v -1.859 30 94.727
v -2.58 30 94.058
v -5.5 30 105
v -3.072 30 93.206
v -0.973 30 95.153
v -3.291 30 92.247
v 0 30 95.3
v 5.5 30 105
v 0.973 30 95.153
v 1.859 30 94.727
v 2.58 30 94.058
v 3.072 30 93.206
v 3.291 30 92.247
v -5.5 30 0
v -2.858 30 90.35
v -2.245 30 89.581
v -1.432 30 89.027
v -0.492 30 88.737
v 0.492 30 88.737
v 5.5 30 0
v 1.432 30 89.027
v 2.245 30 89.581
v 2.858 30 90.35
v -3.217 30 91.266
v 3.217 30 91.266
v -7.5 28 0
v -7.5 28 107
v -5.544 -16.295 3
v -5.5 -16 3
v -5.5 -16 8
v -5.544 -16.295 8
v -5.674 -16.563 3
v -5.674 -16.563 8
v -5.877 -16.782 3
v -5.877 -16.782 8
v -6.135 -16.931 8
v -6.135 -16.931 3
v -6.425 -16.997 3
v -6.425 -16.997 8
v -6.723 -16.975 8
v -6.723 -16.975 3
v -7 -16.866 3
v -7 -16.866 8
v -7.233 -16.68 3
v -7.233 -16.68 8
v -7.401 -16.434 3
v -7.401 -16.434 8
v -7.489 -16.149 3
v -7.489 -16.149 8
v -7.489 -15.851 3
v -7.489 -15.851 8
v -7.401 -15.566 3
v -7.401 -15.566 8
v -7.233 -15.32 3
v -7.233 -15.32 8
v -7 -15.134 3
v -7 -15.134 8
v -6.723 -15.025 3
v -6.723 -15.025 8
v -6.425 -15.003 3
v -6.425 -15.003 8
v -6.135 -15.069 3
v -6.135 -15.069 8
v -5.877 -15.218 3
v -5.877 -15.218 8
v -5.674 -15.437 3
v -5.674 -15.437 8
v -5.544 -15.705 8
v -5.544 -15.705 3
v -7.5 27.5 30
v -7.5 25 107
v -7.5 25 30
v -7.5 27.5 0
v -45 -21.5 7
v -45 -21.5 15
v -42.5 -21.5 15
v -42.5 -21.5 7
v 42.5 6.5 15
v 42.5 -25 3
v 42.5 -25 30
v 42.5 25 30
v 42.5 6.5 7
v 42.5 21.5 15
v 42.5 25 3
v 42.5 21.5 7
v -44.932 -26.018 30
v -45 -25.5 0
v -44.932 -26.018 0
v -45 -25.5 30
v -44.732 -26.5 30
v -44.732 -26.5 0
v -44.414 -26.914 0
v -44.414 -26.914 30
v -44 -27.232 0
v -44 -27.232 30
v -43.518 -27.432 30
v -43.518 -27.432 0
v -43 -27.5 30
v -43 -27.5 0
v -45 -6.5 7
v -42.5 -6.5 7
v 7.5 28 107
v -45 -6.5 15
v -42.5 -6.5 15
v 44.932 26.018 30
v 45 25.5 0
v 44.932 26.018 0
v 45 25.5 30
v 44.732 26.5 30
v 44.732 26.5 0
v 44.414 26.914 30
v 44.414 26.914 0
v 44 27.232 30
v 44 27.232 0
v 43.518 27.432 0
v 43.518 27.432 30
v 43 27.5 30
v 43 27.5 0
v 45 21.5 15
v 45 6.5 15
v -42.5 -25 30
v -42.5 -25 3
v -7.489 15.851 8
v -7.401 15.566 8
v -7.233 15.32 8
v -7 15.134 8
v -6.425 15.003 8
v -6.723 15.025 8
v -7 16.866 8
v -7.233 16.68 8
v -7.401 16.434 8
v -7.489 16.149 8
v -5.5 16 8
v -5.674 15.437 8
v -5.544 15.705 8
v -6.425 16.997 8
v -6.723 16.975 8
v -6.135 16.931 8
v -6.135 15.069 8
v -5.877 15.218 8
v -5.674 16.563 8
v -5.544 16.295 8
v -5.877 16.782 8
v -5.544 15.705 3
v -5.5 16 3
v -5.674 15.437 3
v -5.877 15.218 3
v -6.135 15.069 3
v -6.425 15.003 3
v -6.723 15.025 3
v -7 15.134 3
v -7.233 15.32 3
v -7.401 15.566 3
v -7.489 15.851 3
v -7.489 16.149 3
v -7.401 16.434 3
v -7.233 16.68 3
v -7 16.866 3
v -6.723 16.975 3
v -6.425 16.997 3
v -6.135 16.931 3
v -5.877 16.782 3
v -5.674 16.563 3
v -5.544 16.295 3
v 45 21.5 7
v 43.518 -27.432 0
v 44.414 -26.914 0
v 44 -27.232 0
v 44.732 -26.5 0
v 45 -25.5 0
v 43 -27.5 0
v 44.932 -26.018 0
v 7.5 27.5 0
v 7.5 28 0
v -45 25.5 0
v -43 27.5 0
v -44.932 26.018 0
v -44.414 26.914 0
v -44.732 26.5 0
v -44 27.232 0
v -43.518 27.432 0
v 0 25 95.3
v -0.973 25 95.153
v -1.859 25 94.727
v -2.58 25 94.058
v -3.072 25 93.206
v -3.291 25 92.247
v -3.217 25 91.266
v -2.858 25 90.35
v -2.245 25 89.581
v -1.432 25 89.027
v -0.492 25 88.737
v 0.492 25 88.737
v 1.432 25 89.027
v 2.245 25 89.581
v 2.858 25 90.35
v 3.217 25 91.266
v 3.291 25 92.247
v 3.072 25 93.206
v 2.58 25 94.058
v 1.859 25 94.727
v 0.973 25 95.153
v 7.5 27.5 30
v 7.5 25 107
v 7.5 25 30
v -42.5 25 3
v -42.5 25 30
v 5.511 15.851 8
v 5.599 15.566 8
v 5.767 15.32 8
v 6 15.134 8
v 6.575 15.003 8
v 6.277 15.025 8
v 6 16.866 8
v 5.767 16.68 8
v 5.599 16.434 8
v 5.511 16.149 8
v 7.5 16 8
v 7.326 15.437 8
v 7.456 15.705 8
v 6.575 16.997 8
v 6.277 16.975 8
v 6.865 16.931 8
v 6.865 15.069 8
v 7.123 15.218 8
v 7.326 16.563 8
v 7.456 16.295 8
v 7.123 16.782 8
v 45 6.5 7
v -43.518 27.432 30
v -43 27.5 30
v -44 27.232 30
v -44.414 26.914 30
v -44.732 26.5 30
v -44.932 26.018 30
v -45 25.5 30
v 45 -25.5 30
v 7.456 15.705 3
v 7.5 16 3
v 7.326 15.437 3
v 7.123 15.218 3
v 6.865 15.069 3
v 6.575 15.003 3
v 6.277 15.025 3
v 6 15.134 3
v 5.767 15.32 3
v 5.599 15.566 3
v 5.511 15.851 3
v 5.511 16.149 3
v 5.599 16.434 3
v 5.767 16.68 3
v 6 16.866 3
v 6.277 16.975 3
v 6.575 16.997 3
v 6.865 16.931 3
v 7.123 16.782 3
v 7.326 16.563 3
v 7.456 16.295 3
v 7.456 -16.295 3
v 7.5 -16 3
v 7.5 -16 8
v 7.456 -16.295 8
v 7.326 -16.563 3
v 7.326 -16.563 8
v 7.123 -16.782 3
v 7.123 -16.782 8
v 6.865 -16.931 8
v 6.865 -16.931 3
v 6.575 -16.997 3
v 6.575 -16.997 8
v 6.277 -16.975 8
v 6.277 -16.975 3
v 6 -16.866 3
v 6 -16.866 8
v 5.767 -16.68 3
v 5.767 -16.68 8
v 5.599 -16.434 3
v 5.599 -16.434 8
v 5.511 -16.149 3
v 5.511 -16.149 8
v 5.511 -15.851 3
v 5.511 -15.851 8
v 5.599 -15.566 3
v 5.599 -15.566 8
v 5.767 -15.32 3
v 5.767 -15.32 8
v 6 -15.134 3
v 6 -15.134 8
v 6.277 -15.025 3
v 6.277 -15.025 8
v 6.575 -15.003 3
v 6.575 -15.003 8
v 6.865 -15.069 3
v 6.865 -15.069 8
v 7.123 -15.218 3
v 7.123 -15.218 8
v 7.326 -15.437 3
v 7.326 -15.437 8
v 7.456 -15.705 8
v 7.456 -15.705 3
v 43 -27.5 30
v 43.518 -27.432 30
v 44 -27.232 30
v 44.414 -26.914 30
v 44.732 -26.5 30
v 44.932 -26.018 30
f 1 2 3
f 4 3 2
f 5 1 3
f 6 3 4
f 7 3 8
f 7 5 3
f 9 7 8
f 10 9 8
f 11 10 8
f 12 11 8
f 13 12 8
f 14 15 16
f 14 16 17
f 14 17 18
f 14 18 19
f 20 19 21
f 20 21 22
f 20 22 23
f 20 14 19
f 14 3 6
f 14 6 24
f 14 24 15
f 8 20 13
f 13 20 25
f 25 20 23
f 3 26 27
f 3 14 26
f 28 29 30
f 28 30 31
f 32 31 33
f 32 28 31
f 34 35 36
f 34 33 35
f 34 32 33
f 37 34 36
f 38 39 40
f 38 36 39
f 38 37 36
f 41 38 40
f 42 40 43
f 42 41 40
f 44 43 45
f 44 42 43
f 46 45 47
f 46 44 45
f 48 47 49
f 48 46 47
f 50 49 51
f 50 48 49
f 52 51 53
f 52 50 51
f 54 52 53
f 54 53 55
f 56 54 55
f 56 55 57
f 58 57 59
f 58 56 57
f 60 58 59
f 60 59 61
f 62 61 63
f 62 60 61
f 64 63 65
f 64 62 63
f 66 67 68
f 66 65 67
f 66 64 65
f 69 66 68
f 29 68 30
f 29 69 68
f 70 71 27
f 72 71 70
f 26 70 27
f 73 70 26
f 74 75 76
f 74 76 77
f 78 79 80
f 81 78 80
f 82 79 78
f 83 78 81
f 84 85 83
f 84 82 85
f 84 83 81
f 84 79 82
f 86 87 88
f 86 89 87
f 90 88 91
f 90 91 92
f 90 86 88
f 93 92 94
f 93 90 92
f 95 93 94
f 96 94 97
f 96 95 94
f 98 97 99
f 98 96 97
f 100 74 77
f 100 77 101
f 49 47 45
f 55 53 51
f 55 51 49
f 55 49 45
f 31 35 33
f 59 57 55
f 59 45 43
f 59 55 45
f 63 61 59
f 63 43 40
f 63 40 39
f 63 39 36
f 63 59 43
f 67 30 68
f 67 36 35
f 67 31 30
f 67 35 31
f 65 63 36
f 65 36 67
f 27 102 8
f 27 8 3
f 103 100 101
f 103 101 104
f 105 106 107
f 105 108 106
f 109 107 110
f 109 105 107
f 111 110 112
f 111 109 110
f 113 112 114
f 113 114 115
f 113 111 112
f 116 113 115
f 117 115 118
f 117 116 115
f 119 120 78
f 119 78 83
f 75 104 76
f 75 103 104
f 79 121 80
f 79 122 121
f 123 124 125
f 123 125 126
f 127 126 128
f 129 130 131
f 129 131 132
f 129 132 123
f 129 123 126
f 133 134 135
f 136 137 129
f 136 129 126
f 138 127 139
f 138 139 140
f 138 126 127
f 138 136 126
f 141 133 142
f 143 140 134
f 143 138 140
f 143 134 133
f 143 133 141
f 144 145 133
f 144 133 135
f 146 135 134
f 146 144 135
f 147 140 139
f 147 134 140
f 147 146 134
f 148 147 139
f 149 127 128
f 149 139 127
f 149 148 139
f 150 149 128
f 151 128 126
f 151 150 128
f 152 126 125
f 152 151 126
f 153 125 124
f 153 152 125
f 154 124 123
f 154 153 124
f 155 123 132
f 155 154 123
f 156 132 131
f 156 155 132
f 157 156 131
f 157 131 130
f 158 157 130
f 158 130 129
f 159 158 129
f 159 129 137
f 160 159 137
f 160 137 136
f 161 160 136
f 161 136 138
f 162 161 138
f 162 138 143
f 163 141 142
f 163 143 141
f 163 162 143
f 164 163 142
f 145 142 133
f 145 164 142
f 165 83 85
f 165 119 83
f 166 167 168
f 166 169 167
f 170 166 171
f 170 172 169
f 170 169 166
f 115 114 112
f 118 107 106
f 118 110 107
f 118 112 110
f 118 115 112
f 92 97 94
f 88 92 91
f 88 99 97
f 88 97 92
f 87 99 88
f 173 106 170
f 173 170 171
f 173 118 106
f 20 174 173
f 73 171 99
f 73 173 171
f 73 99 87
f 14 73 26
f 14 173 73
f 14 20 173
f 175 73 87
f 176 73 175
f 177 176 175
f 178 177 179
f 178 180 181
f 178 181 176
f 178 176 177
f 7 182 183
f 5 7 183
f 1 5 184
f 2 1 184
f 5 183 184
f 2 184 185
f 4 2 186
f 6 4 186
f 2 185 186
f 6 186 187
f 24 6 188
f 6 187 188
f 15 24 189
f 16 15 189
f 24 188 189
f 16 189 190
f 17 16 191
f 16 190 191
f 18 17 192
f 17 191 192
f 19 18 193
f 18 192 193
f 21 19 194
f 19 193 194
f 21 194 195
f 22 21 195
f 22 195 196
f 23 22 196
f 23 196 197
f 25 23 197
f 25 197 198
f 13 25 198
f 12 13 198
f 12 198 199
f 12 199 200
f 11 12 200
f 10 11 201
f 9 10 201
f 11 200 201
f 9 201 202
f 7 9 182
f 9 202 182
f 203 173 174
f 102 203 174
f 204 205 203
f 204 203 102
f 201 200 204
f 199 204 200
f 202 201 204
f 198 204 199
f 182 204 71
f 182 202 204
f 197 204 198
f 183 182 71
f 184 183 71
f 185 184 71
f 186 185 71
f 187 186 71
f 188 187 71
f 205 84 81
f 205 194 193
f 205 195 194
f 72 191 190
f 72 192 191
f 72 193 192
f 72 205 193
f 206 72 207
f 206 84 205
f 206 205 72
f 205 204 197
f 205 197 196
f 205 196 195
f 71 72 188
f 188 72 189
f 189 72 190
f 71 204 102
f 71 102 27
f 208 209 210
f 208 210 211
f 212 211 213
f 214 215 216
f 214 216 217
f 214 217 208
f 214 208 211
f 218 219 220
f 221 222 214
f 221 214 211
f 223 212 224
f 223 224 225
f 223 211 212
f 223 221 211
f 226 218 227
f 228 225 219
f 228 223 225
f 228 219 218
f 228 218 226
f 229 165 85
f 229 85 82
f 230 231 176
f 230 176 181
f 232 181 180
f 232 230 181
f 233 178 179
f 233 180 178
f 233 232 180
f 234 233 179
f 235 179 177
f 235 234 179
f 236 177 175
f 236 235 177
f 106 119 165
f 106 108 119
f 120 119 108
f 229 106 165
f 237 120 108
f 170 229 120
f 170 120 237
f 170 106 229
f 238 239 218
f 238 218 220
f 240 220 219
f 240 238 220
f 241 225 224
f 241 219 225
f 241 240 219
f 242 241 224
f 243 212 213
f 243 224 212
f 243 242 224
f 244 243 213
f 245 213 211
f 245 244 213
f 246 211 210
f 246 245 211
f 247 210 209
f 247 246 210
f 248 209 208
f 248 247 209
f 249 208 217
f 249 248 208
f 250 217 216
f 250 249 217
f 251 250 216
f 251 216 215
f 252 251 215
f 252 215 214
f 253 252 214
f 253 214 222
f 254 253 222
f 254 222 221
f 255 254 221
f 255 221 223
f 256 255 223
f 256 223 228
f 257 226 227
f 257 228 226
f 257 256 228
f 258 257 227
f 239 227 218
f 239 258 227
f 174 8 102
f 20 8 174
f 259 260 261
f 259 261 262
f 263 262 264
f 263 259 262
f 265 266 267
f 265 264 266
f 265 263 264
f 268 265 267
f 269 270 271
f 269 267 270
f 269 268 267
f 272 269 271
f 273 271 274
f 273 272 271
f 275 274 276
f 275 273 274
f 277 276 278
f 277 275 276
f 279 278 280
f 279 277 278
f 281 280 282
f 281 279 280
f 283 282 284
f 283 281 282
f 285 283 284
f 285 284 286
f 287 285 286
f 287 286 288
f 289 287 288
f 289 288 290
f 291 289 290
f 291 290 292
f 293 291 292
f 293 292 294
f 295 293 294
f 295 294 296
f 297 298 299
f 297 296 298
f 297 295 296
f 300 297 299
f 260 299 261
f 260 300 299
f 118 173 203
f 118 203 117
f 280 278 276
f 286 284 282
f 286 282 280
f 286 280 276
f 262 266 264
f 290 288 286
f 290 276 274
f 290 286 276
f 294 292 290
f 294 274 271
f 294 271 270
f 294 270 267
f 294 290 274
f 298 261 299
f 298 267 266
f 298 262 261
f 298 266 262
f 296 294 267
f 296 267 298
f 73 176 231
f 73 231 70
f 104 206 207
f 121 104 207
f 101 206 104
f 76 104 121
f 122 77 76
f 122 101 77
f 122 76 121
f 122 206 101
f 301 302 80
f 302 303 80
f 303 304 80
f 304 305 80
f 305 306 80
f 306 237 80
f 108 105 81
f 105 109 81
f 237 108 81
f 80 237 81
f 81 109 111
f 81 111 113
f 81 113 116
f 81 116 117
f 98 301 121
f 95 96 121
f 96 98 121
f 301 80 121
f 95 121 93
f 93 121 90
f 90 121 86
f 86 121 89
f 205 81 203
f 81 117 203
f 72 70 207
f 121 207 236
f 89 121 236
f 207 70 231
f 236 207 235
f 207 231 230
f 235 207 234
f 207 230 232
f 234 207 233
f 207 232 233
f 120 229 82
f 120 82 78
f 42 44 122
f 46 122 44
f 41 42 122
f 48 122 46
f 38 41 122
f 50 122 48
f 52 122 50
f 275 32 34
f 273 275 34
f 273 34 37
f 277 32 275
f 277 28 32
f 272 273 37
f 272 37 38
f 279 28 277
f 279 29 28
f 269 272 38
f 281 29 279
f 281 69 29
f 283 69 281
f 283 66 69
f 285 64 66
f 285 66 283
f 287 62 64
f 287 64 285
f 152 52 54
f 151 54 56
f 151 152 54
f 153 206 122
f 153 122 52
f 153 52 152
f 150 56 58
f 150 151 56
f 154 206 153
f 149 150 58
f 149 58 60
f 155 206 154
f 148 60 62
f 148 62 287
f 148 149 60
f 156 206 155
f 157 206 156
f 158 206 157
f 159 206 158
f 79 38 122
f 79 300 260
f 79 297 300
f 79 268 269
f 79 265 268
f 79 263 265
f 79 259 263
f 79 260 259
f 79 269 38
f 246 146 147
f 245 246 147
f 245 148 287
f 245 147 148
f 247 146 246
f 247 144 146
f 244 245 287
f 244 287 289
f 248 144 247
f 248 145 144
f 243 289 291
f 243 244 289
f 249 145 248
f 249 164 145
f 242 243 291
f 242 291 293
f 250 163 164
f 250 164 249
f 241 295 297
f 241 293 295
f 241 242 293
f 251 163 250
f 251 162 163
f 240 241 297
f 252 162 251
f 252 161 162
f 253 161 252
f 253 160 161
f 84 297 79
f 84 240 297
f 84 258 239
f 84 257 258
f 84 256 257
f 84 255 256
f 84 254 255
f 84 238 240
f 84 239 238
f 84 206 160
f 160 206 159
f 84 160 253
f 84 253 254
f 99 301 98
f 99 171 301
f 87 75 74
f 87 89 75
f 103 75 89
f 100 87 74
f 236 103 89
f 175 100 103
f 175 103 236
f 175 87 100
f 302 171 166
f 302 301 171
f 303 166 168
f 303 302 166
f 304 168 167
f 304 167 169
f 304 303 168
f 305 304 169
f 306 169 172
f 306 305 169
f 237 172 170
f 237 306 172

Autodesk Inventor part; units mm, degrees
ref_plane "YZ Plane" through (0, 0, 0) normal (1, 0, 0) x (0, 1, 0)
ref_plane "XZ Plane" through (0, 0, 0) normal (0, 1, 0) x (-1, 0, 0)
ref_plane "XY Plane" through (0, 0, 0) normal (0, 0, 1) x (1, 0, 0)
sketch "Náčrt1" plane through (0, 0, 0) normal (0, 0, 1) x (1, 0, 0)
  line L0 (0, 35) -> (0, -35) projected
  line L1 (-59.5, 0) -> (59.5, 0) projected
  line L2 (42.5, -25) -> (-42.5, -25)
  line L3 (-42.5, -25) -> (-42.5, 25)
  line L4 (-42.5, 25) -> (42.5, 25)
  line L5 (42.5, 25) -> (42.5, -25)
  point P0 (0, 0)
  dimension "d1" = 85
  dimension "d2" = 50
extrude "Vysunutí1" add sketch "Náčrt1" along normal blind 3
sketch "Náčrt2" plane through (0, 0, 0) normal (0, 0, -1) x (-1, 0, 0)
  line L0 (-42.5, 25) -> (42.5, 25) projected
  line L1 (-42.5, -25) -> (-42.5, 25) projected
  line L2 (42.5, -25) -> (-42.5, -25) projected
  line L3 (42.5, 25) -> (42.5, -25) projected
  line L4 (45, 27.5) -> (-45, 27.5)
  line L5 (-45, 27.5) -> (-45, -27.5)
  line L6 (-45, -27.5) -> (45, -27.5)
  line L7 (45, -27.5) -> (45, 27.5)
  line L8 (-42.5, 25) -> (42.5, 25)
  line L9 (42.5, 25) -> (42.5, -25)
  line L10 (42.5, -25) -> (-42.5, -25)
  line L11 (-42.5, -25) -> (-42.5, 25)
  point P0 (0, 0)
  dimension "d5" = 2.5
extrude "Vysunutí2" add sketch "Náčrt2" against normal blind 30
sketch "Náčrt3" plane through (0, 0, 3) normal (0, 0, 1) x (1, 0, 0)
  line L0 (42.5, 25) -> (-42.5, 25) projected
  line L1 (-42.5, 25) -> (-42.5, -25) projected
  line L2 (-42.5, -25) -> (42.5, -25) projected
  line L3 (42.5, -25) -> (42.5, 25) projected
  line L4 (0, 35) -> (0, -35) projected
  line L5 (-63, 0) -> (63, 0) projected
  line L6 (2.5, 21.5) -> (37.5, 21.5) construction
  line L7 (37.5, 21.5) -> (37.5, -21.5) construction
  line L8 (37.5, -21.5) -> (2.5, -21.5) construction
  line L9 (2.5, -21.5) -> (2.5, 21.5) construction
  line L10 (-2.5, 21.5) -> (-37.5, 21.5) construction
  line L11 (-37.5, 21.5) -> (-37.5, -21.5) construction
  line L12 (-37.5, -21.5) -> (-2.5, -21.5) construction
  line L13 (-2.5, -21.5) -> (-2.5, 21.5) construction
  circle A0 centre (6.5, 16) radius 1
  circle A1 centre (6.5, -16) radius 1
  circle A2 centre (-6.5, 16) radius 1
  circle A3 centre (-6.5, -16) radius 1
  point P0 (0, 0)
  point P1 (9, -16)
  dimension "d8" = 35
  dimension "d9" = 43
  dimension "d10" = 3.5
  dimension "d11" = 5
  dimension "d15" = 2
  dimension "d16" = 36
  dimension "d17" = 16
extrude "Vysunutí3" add sketch "Náčrt3" along normal blind 5 contours A0 | A1 | A2 | A3
sketch "Náčrt4" plane through (45, -27.5, 0) normal (1, 0, 0) x (0, 0, -1)
  line L0 (-3, 2.5) -> (-3, 52.5) projected
  line L1 (0, 55) -> (0, 0) projected
  line L2 (0, 55) -> (-30, 55) projected
  line L3 (-30, 0) -> (-30, 55) projected
  line L4 (0, 0) -> (-30, 0) projected
  line L5 (-36, 27.5) -> (6, 27.5) projected
  line L6 (0, -11) -> (0, 66) projected
  line L7 (-7, 34) -> (-15, 34)
  line L8 (-15, 34) -> (-15, 49)
  line L9 (-15, 49) -> (-7, 49)
  line L10 (-7, 49) -> (-7, 34)
  point P0 (0, 27.5)
  point P1 (-3, 34)
  point P2 (-3, 49)
  dimension "d20" = 8
  dimension "d21" = 15
  dimension "d22" = 6
  dimension "d24" = 7
extrude "Vysunutí4" cut sketch "Náčrt4" against normal up to surface (2.5 mm away) contours L7 L8 L9 L10
pattern_circular "Kruhové pole1" count 2 over 360 about axis through (0, 0, -10) along (0, 0, 1) of "Vysunutí4"
sketch "Náčrt5" plane through (-45, 27.5, 0) normal (0, 1, 0) x (1, 0, 0)
  line L0 (0, 0) -> (90, 0) projected
  line L1 (0, 0) -> (0, -30) projected
  line L2 (90, -30) -> (0, -30) projected
  line L3 (90, 0) -> (90, -30) projected
  line L4 (-18, 0) -> (108, 0) projected
  line L5 (45, 6) -> (45, -36) projected
  line L6 (37.5, -30) -> (52.5, -30)
  line L7 (52.5, -30) -> (52.5, -107)
  line L8 (52.5, -107) -> (37.5, -107)
  line L9 (37.5, -107) -> (37.5, -30)
  line L10 (0, 0) -> (90, 0) projected
  line L11 (52.5, -30) -> (37.5, -30)
  line L12 (37.5, -30) -> (37.5, 0)
  line L13 (37.5, 0) -> (52.5, 0)
  line L14 (52.5, 0) -> (52.5, -30)
  point P0 (45, 0)
  dimension "d31" = 77
  dimension "d32" = 15
  dimension "d33" = 15
extrude "Vysunutí5" add sketch "Náčrt5" along normal mid plane 5 contours L0 L5 L2 L12 | L0 L14 L2 L5 | L2 L7 L8 L9
fillet "Zaoblení1" radius 2 4 edges at (-45, 27.5, 15) (-45, -27.5, 15) (45, -27.5, 15) (45, 27.5, 15)
sketch "Náčrt6" plane through (-45, 30, 0) normal (0, 1, 0) x (1, 0, 0)
  line L0 (37.5, -107) -> (52.5, -107) projected
  line L1 (52.5, -107) -> (52.5, 0) projected
  line L2 (52.5, 0) -> (37.5, 0) projected
  line L3 (37.5, 0) -> (37.5, -107) projected
  point P0 (45, 0)
  point P1 (45, -92)
  point P2 (45, -107)
  dimension "d37" = 7.5
  dimension "d38" = 15
hole "Díra1" at (0, 30, 92) direction (0, -1, 0) diameter 6.6 end through all
chamfer "Zkosení1" distance 2 angle 45 3 edges at (7.5, 30, 53.5) (-7.5, 30, 53.5) (0, 30, 107)
properties part number "adapter_box_3D tisk"
